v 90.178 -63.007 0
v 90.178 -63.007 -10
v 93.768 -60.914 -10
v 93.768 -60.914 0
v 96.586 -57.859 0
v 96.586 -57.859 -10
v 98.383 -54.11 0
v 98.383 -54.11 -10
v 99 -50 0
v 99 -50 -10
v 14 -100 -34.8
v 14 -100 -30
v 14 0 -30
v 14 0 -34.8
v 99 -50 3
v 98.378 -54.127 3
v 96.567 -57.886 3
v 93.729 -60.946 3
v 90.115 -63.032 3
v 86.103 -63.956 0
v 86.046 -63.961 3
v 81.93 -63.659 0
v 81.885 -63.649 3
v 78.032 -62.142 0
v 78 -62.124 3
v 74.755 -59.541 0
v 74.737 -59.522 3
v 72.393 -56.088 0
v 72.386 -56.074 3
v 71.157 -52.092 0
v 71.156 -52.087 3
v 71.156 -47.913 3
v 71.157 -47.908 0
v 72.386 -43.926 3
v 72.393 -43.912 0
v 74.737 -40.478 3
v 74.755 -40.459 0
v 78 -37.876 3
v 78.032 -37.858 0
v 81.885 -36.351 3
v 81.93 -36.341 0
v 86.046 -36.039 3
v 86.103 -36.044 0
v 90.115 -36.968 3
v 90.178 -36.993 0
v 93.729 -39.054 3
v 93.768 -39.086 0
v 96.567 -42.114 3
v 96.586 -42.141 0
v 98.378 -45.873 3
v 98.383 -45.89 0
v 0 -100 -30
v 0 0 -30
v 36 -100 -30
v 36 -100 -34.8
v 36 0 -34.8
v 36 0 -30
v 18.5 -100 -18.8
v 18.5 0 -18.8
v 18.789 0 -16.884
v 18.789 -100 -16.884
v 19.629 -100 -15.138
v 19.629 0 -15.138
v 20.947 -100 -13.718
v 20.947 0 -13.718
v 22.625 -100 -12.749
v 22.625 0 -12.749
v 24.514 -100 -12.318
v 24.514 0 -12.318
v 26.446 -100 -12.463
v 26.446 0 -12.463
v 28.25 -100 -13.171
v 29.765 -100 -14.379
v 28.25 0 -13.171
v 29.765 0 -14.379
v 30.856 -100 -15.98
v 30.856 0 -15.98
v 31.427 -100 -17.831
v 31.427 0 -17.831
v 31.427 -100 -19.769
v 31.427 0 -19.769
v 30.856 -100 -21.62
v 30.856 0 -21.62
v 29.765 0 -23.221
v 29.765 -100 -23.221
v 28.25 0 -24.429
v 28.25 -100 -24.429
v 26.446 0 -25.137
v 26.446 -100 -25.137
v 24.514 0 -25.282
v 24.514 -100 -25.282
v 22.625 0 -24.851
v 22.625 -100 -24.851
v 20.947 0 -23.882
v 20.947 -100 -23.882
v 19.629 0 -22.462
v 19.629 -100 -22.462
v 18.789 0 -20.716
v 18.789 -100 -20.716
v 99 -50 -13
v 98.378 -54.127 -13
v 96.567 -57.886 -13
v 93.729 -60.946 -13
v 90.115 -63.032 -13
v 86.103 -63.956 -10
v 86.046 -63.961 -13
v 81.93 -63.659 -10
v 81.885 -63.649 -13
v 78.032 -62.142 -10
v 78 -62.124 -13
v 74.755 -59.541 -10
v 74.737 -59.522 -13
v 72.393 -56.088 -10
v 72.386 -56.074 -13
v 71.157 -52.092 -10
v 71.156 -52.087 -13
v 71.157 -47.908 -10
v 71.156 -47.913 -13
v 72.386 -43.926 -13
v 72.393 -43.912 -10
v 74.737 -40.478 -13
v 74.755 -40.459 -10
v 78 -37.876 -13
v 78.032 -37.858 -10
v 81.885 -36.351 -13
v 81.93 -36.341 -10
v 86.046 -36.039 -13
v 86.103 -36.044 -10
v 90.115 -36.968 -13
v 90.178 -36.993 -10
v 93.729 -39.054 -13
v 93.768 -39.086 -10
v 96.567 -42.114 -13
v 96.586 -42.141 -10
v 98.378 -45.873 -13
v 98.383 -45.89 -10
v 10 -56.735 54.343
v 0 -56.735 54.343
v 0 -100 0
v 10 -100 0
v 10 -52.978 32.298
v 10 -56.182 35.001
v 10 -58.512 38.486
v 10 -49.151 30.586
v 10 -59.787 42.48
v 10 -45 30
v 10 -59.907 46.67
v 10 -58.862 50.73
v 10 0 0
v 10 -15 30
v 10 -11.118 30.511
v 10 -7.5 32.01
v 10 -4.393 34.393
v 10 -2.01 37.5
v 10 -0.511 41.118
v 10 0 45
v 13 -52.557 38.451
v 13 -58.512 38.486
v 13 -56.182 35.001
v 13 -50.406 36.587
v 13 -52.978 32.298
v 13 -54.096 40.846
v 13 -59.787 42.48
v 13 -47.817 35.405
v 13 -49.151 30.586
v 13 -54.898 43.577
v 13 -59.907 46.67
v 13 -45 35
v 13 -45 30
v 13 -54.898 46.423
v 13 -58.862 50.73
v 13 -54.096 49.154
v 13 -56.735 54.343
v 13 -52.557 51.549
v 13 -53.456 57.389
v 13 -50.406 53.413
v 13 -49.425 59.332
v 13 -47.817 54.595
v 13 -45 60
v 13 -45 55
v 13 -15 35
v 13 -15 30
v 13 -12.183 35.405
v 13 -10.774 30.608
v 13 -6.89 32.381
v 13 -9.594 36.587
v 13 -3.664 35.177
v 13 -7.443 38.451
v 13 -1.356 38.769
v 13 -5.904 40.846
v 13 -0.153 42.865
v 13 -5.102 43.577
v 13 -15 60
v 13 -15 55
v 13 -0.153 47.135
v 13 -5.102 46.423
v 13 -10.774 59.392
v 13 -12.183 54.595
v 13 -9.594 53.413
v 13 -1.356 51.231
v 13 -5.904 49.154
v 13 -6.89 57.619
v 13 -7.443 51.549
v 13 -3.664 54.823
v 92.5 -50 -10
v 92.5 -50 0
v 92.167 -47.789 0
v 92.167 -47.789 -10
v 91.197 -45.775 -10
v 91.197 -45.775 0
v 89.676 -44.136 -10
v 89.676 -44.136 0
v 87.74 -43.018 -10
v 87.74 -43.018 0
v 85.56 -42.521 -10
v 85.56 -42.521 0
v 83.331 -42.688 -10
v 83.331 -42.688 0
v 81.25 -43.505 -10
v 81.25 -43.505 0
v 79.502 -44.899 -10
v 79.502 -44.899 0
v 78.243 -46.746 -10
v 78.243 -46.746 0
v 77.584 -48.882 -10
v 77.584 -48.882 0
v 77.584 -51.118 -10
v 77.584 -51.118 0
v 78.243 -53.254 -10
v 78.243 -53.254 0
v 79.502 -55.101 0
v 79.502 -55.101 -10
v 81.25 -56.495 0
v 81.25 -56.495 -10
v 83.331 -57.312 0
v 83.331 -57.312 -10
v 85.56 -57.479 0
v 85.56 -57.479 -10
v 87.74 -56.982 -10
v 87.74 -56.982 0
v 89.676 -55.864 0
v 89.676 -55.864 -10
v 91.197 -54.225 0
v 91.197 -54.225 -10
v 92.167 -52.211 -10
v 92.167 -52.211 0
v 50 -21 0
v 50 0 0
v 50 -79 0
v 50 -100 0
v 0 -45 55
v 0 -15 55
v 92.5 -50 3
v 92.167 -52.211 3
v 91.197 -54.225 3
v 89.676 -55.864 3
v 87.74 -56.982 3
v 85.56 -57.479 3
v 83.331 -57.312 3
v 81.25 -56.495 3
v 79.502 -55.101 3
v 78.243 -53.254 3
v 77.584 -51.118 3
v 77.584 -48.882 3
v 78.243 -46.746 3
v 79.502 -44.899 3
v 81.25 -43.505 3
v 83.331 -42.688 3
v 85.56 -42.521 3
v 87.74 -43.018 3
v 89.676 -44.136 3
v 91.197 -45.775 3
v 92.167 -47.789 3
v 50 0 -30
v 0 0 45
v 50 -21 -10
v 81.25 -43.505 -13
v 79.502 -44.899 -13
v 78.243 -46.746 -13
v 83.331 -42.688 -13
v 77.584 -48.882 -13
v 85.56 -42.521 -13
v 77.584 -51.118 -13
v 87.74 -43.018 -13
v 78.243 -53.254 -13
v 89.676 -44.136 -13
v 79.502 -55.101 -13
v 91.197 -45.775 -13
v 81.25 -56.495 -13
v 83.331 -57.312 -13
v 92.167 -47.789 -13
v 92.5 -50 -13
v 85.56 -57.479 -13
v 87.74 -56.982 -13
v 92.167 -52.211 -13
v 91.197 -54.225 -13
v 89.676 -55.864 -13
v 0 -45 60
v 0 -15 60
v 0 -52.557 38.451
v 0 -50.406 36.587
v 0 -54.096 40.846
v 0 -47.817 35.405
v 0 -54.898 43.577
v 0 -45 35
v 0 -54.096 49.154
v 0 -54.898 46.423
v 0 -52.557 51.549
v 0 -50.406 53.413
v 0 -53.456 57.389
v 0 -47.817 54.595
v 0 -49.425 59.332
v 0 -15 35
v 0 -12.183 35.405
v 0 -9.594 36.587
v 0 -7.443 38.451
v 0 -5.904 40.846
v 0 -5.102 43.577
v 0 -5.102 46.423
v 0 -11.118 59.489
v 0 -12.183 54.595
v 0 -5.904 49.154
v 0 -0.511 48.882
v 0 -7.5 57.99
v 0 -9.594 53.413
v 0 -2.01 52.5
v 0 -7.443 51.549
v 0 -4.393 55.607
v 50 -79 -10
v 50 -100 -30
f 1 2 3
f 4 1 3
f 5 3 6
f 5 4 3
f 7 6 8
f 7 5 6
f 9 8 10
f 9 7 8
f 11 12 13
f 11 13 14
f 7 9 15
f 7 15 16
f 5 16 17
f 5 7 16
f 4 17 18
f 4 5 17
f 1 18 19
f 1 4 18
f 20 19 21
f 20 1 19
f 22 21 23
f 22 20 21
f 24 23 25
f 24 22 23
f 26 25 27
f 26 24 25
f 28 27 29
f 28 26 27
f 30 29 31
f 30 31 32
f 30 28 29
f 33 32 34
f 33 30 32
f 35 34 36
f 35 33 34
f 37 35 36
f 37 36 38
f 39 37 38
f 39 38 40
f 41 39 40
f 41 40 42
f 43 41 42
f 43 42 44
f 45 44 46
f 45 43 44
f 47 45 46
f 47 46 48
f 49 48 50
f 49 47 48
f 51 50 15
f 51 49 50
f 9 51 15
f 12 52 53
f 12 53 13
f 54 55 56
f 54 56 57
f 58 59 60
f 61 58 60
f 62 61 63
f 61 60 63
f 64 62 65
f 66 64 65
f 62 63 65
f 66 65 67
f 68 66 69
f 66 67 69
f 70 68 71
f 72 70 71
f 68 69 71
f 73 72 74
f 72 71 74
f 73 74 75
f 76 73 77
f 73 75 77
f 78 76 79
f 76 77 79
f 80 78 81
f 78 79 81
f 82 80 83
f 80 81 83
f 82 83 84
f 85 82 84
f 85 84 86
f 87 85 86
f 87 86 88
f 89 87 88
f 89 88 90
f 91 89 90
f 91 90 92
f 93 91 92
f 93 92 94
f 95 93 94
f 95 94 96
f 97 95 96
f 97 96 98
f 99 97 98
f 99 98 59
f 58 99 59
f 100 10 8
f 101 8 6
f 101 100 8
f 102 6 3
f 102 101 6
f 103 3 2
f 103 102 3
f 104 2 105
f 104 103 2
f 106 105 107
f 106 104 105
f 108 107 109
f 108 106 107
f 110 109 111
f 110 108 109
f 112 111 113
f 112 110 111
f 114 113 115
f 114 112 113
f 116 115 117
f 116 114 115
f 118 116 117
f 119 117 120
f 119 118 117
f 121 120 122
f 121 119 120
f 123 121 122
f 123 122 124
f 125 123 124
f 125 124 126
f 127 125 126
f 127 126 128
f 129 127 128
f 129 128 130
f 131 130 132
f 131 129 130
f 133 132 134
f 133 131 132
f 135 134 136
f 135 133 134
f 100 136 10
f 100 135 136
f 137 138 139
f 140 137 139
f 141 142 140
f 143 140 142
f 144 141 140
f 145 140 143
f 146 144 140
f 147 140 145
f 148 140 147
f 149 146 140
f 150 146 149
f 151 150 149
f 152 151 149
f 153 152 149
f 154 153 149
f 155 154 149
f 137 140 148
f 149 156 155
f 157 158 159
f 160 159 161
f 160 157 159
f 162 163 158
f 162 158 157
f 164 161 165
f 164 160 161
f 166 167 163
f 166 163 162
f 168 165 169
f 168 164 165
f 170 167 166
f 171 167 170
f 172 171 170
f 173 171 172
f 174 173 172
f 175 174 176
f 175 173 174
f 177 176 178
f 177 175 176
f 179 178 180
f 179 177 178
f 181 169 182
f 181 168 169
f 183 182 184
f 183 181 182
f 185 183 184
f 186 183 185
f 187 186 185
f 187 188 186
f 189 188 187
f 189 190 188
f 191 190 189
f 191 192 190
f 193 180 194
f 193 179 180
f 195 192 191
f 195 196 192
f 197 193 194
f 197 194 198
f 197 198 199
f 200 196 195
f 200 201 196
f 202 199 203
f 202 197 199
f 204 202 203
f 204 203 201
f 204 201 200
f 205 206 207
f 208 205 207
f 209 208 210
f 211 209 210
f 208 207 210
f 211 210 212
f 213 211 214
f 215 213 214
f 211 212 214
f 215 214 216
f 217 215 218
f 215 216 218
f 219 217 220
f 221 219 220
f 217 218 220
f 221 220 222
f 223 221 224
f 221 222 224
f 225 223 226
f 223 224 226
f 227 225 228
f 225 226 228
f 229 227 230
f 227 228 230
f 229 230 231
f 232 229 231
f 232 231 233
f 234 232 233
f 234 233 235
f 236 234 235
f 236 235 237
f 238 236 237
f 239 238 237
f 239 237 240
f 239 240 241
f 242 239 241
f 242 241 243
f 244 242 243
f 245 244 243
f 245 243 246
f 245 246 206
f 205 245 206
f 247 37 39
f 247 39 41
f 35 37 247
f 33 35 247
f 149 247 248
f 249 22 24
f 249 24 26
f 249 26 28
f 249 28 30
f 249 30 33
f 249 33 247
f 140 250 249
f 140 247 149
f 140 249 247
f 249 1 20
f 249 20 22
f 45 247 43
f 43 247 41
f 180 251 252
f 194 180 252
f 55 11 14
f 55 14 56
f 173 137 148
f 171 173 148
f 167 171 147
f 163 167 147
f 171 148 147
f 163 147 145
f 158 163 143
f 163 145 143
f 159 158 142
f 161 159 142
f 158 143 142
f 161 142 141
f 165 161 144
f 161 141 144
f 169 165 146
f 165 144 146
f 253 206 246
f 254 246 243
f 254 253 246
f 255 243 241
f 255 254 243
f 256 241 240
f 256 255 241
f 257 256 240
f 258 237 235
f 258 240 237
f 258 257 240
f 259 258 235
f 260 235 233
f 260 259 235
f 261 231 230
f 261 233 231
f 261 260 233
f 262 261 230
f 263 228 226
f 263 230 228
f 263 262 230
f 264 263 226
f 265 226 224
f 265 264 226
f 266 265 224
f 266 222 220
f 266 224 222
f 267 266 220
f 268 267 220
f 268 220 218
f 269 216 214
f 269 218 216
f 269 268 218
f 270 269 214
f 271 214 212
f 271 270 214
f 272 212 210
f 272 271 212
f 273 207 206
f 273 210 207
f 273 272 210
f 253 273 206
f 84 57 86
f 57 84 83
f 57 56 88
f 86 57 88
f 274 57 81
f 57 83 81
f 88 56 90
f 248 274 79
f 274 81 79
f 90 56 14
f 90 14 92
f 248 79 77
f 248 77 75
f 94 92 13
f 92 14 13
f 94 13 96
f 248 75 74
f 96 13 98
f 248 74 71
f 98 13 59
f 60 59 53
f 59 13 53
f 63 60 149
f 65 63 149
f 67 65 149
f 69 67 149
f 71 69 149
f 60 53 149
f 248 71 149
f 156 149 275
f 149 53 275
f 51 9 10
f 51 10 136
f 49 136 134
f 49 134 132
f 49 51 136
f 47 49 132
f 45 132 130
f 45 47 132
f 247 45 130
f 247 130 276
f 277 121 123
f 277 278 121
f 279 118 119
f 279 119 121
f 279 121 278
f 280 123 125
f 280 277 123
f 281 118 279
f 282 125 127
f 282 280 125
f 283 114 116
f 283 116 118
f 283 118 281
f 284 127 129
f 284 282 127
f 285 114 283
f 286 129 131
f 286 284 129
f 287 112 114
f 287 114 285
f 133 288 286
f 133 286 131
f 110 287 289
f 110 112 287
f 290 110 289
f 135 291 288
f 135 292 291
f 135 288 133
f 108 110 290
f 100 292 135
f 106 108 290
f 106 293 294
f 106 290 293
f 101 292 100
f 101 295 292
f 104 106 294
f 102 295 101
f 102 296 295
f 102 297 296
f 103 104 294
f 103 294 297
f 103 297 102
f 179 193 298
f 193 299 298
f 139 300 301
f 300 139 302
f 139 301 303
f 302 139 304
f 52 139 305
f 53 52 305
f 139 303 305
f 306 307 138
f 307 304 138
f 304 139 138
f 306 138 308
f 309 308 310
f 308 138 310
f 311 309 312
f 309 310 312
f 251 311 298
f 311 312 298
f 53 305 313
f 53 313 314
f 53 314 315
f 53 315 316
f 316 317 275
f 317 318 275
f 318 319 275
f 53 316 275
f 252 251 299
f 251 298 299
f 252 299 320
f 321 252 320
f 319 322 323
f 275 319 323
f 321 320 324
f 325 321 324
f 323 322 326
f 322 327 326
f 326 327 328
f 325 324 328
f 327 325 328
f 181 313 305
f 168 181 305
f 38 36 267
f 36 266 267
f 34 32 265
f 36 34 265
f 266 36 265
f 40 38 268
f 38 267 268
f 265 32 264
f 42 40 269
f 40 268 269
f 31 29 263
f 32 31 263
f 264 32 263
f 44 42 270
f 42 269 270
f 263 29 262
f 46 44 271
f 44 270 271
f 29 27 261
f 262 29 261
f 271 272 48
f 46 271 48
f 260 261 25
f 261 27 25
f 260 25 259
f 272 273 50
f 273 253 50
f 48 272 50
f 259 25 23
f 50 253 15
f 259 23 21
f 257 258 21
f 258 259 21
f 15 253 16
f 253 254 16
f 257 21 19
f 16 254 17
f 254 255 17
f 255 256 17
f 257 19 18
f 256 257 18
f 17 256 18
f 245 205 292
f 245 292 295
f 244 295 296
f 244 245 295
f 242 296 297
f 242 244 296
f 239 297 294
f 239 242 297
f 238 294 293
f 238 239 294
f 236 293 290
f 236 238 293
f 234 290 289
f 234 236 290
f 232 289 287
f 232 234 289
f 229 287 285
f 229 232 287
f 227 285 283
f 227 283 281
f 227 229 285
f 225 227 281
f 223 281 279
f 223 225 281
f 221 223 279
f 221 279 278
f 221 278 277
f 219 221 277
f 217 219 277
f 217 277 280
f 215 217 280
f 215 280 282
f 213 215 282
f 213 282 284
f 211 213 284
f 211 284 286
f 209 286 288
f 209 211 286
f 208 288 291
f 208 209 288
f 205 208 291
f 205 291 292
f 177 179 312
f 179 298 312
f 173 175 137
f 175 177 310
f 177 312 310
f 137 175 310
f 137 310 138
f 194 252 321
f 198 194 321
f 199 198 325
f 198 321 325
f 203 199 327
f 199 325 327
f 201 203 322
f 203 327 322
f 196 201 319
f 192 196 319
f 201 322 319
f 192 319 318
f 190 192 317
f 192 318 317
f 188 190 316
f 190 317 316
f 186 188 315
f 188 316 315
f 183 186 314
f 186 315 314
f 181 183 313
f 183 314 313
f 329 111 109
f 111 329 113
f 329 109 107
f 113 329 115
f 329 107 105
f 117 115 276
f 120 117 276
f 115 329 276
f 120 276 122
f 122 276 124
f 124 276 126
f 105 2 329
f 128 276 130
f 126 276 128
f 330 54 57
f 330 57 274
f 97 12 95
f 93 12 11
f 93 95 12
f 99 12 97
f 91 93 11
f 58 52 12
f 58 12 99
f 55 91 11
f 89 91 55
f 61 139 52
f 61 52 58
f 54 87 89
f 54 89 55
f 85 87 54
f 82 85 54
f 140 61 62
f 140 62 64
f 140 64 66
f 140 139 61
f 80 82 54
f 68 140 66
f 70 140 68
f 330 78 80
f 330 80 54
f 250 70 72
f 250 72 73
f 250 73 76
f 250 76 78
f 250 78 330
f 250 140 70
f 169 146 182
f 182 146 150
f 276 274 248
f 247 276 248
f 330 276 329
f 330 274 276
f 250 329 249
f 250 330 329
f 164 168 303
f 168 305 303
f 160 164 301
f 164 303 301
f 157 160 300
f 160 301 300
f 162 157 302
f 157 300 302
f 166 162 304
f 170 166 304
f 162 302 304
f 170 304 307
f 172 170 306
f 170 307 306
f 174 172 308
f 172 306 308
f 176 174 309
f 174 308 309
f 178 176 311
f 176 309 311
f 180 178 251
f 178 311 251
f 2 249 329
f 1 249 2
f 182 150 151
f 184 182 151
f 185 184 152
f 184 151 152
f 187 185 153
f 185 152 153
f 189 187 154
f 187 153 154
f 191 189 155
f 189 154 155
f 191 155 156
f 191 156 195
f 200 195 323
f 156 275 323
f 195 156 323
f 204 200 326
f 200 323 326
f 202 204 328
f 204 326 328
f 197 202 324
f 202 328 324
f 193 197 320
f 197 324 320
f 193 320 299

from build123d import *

# Parameters (mm, degrees)
F1_DEPTH  = 100
F3_DEPTH  = 10
F8_DEPTH  = 3
F10_DEPTH = 25
F12_DEPTH = 10
F14_R     = 14
F14_R_2   = 7.5
F15_DEPTH = 8
F16_R     = 7.5
F17_DEPTH = 25
F19_D     = 13


with BuildPart() as f1:
    # F0 (on Front) → F1 (new body)
    with BuildSketch(Plane.XZ):
        Polygon((50, 0), (0, 0), (0, -30), (14, -30), (14, -34.8), (36, -34.8), (36, -30), (50, -30), align=None)
    extrude(amount=F1_DEPTH)

    # F2 (on face) → F3 (join)
    with BuildSketch(Plane(origin=(0, 0, 0), x_dir=(0, -1, 0), z_dir=(-1, 0, 0))):
        with BuildLine():
            Line((43.2649507991, 54.3428379122), (0, 0))
            Line((0, 0), (100, 0))
            Line((100, 0), (100, 45))
            ThreePointArc((100, 45), (95.6066017178, 55.6066017178), (85, 60))
            Line((85, 60), (55, 60))
            ThreePointArc((55, 60), (48.4862671487, 58.5118941804), (43.2649507991, 54.3428379122))
        make_face()
    extrude(amount=-F3_DEPTH)


with BuildPart() as f5_1:
    # F5: instance of F1
    add(f1.part.mirror(Plane(origin=(22.8108581436, -50, -11.9144915301), x_dir=(1, 0, 0), z_dir=(0, 1, 0))))

    # F7 (on face) → F8 (join)
    with BuildSketch(Plane.YZ.offset(10)):
        with BuildLine():
            ThreePointArc((-15, 30), (-4.3933982822, 34.3933982822), (0, 45))
            ThreePointArc((0, 45), (-4.3933982822, 55.6066017178), (-15, 60))
            Line((-15, 60), (-45, 60))
            ThreePointArc((-45, 60), (-51.5137328513, 58.5118941804), (-56.7350492009, 54.3428379122))
            ThreePointArc((-56.7350492009, 54.3428379122), (-58.5118941804, 38.4862671487), (-45, 30))
            Line((-45, 30), (-15, 30))
        make_face()
        with BuildLine():
            ThreePointArc((-45, 35), (-55, 45), (-45, 55))
            Line((-45, 55), (-15, 55))
            ThreePointArc((-15, 55), (-5, 45), (-15, 35))
            Line((-15, 35), (-45, 35))
        make_face(mode=Mode.SUBTRACT)
    extrude(amount=F8_DEPTH)

    # F9 (on face) → F10 (cut)
    with BuildSketch(Plane.YZ.offset(10)):
        with BuildLine():
            Line((-15, 55), (-45, 55))
            ThreePointArc((-45, 55), (-55, 45), (-45, 35))
            Line((-45, 35), (-15, 35))
            ThreePointArc((-15, 35), (-5, 45), (-15, 55))
        make_face()
    extrude(amount=-F10_DEPTH, mode=Mode.SUBTRACT)

    # F11 (on face) → F12 (join)
    with BuildSketch(Plane.XY):
        with BuildLine():
            Line((50, -50), (50, -79))
            Line((50, -79), (90.1775700039, -63.0074120737))
            ThreePointArc((90.1775700039, -63.0074120737), (99, -50), (90.1775700039, -36.9925879263))
            Line((90.1775700039, -36.9925879263), (50, -21))
            Line((50, -21), (50, -50))
        make_face()
    extrude(amount=-F12_DEPTH)

    # F14 (on mid) → F15 (join, symmetric)
    with BuildSketch(Plane(origin=(0, 0, -5), x_dir=(1, 0, 0), z_dir=(0, 0, -1))):
        with Locations((85, 50)):
            Circle(F14_R)
        with Locations((85, 50)):
            Circle(F14_R_2, mode=Mode.SUBTRACT)
    extrude(amount=F15_DEPTH, both=True)

    # F16 (on face) → F17 (cut)
    with BuildSketch(Plane.XY):
        with Locations((85, -50)):
            Circle(F16_R)
    extrude(amount=-F17_DEPTH, mode=Mode.SUBTRACT)

    # F19 (through all)
    with Locations(Plane.XZ.offset(100)):
        with Locations((25, -18.8)):
            Hole(F19_D / 2)


solid = f5_1.part
